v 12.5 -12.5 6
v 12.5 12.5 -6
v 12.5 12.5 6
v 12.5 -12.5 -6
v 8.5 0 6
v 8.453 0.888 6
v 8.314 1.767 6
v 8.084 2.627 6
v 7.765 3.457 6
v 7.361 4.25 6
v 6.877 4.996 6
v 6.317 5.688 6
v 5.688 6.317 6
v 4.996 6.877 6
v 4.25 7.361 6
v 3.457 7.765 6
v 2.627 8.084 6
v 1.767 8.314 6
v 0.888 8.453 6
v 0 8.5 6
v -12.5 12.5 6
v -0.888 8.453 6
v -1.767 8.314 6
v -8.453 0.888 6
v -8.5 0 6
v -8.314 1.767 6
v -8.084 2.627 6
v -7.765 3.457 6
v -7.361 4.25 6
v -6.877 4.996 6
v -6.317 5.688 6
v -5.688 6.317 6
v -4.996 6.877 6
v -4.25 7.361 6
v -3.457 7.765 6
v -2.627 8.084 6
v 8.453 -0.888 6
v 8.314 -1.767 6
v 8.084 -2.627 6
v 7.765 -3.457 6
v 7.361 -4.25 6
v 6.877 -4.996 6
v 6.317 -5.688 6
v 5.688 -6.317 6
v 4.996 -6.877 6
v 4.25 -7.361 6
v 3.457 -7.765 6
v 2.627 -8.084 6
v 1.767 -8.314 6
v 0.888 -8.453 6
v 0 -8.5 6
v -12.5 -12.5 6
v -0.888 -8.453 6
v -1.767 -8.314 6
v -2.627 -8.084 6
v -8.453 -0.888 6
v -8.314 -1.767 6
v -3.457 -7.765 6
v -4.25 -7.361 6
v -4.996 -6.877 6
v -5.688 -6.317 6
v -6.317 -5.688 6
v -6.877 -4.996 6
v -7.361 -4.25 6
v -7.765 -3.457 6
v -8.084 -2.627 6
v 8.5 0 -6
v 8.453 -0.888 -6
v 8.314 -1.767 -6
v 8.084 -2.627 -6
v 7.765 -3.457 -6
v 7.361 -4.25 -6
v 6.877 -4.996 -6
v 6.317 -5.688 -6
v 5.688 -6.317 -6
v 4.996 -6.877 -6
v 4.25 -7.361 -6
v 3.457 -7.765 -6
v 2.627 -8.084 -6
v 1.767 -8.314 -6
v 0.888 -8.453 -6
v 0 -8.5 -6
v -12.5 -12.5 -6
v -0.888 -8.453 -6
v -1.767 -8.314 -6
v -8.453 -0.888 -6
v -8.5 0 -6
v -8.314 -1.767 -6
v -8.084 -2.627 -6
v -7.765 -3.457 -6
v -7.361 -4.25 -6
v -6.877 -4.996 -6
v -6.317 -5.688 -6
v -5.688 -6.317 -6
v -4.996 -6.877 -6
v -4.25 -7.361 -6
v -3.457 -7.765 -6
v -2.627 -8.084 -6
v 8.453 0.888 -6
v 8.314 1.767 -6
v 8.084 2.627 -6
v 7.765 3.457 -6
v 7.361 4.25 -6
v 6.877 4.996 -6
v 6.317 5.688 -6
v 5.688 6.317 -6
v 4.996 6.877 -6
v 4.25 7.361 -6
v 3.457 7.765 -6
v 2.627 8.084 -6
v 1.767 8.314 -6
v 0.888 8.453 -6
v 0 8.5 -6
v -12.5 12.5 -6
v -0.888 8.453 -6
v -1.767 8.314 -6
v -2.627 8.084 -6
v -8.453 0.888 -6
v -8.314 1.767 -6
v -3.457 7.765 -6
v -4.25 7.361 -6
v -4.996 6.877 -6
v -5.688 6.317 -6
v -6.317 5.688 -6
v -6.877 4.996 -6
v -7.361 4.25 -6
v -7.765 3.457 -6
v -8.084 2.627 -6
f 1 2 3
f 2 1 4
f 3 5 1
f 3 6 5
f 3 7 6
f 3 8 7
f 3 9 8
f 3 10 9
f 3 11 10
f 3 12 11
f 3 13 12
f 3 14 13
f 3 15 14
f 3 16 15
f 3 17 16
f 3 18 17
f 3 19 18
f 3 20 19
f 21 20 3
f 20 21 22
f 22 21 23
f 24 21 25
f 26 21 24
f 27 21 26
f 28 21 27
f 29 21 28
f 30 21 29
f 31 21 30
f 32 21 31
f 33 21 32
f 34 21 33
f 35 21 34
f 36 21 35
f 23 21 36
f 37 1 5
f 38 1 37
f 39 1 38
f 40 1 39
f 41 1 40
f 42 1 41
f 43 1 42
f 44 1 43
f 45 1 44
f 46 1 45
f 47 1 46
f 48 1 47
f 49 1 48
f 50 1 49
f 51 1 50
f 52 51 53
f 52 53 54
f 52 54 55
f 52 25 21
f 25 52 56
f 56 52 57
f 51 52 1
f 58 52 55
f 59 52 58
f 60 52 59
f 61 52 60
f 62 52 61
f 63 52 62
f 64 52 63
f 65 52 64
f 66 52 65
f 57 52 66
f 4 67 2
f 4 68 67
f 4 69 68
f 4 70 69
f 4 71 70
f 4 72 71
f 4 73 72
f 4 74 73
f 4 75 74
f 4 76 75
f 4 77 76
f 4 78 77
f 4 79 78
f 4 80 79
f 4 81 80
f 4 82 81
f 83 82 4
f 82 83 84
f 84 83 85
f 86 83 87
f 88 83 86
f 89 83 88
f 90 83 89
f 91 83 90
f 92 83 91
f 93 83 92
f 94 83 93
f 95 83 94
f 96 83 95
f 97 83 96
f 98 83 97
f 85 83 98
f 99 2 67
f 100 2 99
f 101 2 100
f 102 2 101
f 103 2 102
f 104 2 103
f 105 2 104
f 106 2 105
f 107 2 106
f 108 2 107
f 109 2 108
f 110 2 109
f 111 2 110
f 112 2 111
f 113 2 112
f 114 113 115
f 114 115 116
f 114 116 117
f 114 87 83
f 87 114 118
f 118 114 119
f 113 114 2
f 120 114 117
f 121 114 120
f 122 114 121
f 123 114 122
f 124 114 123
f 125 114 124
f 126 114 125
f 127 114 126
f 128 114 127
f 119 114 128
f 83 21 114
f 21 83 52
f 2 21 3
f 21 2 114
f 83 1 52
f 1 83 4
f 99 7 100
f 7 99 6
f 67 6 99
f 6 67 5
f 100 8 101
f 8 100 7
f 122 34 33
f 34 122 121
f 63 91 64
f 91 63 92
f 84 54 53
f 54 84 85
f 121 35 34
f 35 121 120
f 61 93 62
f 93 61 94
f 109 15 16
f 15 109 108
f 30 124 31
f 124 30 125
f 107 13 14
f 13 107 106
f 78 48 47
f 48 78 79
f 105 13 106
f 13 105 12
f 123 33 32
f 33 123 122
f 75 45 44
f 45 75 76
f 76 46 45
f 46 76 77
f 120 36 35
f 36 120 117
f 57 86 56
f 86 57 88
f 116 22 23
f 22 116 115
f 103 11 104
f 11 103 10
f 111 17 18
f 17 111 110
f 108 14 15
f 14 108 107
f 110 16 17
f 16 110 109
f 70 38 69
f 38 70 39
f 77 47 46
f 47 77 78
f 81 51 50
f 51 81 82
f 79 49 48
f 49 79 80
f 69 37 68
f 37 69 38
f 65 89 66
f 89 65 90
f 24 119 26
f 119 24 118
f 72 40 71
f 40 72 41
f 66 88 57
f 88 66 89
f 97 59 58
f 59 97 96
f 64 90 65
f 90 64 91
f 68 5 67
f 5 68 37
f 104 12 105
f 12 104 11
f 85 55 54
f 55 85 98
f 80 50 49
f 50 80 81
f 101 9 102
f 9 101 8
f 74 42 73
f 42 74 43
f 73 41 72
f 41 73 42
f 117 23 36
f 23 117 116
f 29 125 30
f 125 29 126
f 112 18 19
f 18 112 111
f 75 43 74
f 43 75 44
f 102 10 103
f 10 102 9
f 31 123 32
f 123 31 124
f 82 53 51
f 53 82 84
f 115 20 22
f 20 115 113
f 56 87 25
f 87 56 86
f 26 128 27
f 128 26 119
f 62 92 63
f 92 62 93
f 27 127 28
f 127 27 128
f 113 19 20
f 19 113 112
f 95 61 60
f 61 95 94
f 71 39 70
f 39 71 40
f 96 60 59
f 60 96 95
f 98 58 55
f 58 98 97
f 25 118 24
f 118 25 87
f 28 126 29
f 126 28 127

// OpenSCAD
// Square nut.
$fn = 60;
eps = 0.02;
thread_d = 17;
side = 25;
thickness = 12;
difference() {
    cube([side, side, thickness], center = true);
    translate([0, 0, -thickness / 2 - eps]) cylinder(d = thread_d, h = thickness + 2 * eps);
}
